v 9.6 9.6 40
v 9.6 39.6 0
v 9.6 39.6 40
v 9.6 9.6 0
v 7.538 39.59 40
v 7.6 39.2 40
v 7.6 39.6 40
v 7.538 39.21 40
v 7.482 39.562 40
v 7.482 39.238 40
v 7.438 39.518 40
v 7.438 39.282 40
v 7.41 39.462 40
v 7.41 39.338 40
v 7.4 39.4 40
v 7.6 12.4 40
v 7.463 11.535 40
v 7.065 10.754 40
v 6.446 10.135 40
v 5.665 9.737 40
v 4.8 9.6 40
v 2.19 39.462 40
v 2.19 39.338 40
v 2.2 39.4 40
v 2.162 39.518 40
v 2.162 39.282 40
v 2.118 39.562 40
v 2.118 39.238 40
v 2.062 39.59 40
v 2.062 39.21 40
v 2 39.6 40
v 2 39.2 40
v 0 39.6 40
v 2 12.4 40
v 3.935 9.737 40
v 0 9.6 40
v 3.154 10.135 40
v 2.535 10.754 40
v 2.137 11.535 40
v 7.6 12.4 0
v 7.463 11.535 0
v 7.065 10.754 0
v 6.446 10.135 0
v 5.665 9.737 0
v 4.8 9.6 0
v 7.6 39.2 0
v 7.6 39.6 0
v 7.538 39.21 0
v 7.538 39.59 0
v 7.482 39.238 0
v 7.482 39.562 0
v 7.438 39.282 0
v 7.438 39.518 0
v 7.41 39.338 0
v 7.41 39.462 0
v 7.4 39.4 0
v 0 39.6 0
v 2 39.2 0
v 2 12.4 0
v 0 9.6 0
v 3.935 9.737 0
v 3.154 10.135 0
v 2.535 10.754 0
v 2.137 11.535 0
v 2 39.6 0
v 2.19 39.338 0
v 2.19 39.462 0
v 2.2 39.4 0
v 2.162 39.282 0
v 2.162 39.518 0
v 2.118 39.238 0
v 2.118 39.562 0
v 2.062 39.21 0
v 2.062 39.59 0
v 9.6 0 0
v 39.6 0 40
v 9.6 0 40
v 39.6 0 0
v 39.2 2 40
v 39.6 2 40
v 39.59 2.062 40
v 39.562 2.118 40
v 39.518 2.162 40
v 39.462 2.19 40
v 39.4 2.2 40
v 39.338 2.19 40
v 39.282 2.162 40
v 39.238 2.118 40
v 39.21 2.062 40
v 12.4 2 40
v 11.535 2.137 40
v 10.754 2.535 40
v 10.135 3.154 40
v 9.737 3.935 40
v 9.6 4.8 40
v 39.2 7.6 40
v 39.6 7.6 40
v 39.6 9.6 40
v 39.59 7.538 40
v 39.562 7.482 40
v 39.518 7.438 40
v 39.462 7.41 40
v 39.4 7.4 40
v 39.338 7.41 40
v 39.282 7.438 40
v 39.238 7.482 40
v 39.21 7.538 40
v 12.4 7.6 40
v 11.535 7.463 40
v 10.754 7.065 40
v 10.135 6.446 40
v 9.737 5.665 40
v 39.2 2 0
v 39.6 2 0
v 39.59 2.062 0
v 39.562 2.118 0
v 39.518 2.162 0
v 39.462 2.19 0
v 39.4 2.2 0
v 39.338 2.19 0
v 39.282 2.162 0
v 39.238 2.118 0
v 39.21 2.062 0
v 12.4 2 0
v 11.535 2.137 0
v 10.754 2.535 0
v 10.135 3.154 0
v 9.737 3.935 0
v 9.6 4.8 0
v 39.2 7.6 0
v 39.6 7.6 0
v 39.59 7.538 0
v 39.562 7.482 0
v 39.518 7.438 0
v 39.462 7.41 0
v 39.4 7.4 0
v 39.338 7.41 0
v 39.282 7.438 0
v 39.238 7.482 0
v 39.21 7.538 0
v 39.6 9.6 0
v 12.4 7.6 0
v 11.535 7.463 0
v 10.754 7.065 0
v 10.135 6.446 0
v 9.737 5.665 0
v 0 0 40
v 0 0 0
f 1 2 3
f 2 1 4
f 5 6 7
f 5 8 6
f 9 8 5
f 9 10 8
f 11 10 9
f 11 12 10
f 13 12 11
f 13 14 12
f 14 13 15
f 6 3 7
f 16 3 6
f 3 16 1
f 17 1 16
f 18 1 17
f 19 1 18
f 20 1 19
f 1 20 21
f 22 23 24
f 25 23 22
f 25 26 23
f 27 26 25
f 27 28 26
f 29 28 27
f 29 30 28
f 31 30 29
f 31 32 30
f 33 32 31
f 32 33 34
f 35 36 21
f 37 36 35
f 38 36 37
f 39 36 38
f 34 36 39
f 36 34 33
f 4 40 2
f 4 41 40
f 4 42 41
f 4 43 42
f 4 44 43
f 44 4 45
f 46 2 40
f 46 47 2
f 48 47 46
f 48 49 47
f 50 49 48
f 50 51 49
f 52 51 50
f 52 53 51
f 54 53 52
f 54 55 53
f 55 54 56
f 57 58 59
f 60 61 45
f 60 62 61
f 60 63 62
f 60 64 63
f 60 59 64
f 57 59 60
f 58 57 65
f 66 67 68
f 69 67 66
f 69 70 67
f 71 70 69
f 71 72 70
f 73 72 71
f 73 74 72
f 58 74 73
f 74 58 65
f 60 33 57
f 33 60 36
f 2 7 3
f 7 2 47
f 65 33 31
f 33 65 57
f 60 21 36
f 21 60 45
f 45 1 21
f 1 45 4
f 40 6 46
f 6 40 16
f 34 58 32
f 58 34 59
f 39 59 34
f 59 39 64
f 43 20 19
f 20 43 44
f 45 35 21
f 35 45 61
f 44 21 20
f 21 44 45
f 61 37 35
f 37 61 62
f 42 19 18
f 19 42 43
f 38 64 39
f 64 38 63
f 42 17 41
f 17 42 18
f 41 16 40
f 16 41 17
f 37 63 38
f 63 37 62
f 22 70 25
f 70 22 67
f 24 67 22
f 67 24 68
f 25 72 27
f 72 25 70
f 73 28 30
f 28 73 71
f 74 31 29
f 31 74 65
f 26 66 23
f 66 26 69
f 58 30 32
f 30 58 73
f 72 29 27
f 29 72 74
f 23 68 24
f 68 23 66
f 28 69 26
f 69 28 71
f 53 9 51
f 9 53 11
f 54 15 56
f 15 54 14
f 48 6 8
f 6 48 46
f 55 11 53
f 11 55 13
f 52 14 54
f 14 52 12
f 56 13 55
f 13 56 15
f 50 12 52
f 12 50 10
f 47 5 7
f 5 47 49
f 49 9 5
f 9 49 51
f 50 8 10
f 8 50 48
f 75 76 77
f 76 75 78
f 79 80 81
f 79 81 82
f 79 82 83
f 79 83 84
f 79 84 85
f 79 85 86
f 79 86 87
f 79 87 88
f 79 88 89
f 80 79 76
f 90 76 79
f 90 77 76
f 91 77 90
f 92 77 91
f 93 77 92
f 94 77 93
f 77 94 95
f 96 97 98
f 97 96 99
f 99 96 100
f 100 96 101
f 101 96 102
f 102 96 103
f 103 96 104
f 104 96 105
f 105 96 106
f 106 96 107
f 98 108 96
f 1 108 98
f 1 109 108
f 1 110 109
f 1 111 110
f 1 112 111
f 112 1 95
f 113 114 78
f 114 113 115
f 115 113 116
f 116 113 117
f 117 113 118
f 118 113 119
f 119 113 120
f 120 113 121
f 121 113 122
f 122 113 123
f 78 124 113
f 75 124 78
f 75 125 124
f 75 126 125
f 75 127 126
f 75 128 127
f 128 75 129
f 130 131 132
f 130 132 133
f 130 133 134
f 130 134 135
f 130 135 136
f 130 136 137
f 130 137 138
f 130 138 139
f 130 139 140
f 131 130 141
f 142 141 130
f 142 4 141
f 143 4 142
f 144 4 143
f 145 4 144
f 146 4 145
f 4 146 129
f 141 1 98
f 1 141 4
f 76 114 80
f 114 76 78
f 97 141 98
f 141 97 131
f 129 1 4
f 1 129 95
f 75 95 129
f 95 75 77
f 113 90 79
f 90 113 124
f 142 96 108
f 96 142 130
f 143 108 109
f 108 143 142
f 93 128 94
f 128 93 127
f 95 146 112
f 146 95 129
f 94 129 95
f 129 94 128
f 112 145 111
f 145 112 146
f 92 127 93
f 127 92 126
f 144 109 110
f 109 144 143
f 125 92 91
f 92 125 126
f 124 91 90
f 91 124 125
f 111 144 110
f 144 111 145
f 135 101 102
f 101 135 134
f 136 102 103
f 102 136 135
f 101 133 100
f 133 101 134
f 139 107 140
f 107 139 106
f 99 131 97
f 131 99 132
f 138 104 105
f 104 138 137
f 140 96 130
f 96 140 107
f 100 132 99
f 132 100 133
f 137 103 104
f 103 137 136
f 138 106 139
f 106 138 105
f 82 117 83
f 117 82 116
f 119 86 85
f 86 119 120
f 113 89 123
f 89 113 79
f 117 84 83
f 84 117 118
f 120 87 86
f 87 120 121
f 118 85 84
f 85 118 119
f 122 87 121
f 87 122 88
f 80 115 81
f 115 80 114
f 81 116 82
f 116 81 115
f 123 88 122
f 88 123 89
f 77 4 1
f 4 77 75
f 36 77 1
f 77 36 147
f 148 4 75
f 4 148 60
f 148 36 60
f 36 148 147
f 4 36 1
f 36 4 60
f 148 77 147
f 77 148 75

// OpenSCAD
// file: Clip.scad
module CoreFluteClip(panelthickness,plasticThickness,winglength,Height,Gripers = 0.2){
    _ClipThickness = panelthickness + plasticThickness*2;
    _cutletOffsetRadius = panelthickness/2;

    // body of clip
    difference(){
        cube([_ClipThickness,winglength,Height]);

        translate([plasticThickness,_cutletOffsetRadius,-0.01])
        cube([panelthickness,winglength,Height+0.02]);

        translate([_cutletOffsetRadius+plasticThickness,_cutletOffsetRadius,-0.01])
        cylinder(r=_cutletOffsetRadius, h=Height+0.02);
    }    

    //gripers
    translate([plasticThickness,winglength-Gripers,0])
    cylinder(r=Gripers,Height);

    translate([_ClipThickness-plasticThickness,winglength-Gripers,0])
    cylinder(r=Gripers,Height);

}
// main file
$fa = 1;
$fs = 0.4;
$fn = 20;
include <./Clip.scad>;

panelthickness = 5.6;
plasticThickness = 2;
winglength = 30;
Height = 40;

netThickness = panelthickness+plasticThickness*2;
cube([netThickness,netThickness,Height]);
translate([0,netThickness,0])
CoreFluteClip(panelthickness,plasticThickness,winglength,Height);

rotate([0,0,-90])
translate([-netThickness,netThickness,0])
CoreFluteClip(panelthickness,plasticThickness,winglength,Height);
